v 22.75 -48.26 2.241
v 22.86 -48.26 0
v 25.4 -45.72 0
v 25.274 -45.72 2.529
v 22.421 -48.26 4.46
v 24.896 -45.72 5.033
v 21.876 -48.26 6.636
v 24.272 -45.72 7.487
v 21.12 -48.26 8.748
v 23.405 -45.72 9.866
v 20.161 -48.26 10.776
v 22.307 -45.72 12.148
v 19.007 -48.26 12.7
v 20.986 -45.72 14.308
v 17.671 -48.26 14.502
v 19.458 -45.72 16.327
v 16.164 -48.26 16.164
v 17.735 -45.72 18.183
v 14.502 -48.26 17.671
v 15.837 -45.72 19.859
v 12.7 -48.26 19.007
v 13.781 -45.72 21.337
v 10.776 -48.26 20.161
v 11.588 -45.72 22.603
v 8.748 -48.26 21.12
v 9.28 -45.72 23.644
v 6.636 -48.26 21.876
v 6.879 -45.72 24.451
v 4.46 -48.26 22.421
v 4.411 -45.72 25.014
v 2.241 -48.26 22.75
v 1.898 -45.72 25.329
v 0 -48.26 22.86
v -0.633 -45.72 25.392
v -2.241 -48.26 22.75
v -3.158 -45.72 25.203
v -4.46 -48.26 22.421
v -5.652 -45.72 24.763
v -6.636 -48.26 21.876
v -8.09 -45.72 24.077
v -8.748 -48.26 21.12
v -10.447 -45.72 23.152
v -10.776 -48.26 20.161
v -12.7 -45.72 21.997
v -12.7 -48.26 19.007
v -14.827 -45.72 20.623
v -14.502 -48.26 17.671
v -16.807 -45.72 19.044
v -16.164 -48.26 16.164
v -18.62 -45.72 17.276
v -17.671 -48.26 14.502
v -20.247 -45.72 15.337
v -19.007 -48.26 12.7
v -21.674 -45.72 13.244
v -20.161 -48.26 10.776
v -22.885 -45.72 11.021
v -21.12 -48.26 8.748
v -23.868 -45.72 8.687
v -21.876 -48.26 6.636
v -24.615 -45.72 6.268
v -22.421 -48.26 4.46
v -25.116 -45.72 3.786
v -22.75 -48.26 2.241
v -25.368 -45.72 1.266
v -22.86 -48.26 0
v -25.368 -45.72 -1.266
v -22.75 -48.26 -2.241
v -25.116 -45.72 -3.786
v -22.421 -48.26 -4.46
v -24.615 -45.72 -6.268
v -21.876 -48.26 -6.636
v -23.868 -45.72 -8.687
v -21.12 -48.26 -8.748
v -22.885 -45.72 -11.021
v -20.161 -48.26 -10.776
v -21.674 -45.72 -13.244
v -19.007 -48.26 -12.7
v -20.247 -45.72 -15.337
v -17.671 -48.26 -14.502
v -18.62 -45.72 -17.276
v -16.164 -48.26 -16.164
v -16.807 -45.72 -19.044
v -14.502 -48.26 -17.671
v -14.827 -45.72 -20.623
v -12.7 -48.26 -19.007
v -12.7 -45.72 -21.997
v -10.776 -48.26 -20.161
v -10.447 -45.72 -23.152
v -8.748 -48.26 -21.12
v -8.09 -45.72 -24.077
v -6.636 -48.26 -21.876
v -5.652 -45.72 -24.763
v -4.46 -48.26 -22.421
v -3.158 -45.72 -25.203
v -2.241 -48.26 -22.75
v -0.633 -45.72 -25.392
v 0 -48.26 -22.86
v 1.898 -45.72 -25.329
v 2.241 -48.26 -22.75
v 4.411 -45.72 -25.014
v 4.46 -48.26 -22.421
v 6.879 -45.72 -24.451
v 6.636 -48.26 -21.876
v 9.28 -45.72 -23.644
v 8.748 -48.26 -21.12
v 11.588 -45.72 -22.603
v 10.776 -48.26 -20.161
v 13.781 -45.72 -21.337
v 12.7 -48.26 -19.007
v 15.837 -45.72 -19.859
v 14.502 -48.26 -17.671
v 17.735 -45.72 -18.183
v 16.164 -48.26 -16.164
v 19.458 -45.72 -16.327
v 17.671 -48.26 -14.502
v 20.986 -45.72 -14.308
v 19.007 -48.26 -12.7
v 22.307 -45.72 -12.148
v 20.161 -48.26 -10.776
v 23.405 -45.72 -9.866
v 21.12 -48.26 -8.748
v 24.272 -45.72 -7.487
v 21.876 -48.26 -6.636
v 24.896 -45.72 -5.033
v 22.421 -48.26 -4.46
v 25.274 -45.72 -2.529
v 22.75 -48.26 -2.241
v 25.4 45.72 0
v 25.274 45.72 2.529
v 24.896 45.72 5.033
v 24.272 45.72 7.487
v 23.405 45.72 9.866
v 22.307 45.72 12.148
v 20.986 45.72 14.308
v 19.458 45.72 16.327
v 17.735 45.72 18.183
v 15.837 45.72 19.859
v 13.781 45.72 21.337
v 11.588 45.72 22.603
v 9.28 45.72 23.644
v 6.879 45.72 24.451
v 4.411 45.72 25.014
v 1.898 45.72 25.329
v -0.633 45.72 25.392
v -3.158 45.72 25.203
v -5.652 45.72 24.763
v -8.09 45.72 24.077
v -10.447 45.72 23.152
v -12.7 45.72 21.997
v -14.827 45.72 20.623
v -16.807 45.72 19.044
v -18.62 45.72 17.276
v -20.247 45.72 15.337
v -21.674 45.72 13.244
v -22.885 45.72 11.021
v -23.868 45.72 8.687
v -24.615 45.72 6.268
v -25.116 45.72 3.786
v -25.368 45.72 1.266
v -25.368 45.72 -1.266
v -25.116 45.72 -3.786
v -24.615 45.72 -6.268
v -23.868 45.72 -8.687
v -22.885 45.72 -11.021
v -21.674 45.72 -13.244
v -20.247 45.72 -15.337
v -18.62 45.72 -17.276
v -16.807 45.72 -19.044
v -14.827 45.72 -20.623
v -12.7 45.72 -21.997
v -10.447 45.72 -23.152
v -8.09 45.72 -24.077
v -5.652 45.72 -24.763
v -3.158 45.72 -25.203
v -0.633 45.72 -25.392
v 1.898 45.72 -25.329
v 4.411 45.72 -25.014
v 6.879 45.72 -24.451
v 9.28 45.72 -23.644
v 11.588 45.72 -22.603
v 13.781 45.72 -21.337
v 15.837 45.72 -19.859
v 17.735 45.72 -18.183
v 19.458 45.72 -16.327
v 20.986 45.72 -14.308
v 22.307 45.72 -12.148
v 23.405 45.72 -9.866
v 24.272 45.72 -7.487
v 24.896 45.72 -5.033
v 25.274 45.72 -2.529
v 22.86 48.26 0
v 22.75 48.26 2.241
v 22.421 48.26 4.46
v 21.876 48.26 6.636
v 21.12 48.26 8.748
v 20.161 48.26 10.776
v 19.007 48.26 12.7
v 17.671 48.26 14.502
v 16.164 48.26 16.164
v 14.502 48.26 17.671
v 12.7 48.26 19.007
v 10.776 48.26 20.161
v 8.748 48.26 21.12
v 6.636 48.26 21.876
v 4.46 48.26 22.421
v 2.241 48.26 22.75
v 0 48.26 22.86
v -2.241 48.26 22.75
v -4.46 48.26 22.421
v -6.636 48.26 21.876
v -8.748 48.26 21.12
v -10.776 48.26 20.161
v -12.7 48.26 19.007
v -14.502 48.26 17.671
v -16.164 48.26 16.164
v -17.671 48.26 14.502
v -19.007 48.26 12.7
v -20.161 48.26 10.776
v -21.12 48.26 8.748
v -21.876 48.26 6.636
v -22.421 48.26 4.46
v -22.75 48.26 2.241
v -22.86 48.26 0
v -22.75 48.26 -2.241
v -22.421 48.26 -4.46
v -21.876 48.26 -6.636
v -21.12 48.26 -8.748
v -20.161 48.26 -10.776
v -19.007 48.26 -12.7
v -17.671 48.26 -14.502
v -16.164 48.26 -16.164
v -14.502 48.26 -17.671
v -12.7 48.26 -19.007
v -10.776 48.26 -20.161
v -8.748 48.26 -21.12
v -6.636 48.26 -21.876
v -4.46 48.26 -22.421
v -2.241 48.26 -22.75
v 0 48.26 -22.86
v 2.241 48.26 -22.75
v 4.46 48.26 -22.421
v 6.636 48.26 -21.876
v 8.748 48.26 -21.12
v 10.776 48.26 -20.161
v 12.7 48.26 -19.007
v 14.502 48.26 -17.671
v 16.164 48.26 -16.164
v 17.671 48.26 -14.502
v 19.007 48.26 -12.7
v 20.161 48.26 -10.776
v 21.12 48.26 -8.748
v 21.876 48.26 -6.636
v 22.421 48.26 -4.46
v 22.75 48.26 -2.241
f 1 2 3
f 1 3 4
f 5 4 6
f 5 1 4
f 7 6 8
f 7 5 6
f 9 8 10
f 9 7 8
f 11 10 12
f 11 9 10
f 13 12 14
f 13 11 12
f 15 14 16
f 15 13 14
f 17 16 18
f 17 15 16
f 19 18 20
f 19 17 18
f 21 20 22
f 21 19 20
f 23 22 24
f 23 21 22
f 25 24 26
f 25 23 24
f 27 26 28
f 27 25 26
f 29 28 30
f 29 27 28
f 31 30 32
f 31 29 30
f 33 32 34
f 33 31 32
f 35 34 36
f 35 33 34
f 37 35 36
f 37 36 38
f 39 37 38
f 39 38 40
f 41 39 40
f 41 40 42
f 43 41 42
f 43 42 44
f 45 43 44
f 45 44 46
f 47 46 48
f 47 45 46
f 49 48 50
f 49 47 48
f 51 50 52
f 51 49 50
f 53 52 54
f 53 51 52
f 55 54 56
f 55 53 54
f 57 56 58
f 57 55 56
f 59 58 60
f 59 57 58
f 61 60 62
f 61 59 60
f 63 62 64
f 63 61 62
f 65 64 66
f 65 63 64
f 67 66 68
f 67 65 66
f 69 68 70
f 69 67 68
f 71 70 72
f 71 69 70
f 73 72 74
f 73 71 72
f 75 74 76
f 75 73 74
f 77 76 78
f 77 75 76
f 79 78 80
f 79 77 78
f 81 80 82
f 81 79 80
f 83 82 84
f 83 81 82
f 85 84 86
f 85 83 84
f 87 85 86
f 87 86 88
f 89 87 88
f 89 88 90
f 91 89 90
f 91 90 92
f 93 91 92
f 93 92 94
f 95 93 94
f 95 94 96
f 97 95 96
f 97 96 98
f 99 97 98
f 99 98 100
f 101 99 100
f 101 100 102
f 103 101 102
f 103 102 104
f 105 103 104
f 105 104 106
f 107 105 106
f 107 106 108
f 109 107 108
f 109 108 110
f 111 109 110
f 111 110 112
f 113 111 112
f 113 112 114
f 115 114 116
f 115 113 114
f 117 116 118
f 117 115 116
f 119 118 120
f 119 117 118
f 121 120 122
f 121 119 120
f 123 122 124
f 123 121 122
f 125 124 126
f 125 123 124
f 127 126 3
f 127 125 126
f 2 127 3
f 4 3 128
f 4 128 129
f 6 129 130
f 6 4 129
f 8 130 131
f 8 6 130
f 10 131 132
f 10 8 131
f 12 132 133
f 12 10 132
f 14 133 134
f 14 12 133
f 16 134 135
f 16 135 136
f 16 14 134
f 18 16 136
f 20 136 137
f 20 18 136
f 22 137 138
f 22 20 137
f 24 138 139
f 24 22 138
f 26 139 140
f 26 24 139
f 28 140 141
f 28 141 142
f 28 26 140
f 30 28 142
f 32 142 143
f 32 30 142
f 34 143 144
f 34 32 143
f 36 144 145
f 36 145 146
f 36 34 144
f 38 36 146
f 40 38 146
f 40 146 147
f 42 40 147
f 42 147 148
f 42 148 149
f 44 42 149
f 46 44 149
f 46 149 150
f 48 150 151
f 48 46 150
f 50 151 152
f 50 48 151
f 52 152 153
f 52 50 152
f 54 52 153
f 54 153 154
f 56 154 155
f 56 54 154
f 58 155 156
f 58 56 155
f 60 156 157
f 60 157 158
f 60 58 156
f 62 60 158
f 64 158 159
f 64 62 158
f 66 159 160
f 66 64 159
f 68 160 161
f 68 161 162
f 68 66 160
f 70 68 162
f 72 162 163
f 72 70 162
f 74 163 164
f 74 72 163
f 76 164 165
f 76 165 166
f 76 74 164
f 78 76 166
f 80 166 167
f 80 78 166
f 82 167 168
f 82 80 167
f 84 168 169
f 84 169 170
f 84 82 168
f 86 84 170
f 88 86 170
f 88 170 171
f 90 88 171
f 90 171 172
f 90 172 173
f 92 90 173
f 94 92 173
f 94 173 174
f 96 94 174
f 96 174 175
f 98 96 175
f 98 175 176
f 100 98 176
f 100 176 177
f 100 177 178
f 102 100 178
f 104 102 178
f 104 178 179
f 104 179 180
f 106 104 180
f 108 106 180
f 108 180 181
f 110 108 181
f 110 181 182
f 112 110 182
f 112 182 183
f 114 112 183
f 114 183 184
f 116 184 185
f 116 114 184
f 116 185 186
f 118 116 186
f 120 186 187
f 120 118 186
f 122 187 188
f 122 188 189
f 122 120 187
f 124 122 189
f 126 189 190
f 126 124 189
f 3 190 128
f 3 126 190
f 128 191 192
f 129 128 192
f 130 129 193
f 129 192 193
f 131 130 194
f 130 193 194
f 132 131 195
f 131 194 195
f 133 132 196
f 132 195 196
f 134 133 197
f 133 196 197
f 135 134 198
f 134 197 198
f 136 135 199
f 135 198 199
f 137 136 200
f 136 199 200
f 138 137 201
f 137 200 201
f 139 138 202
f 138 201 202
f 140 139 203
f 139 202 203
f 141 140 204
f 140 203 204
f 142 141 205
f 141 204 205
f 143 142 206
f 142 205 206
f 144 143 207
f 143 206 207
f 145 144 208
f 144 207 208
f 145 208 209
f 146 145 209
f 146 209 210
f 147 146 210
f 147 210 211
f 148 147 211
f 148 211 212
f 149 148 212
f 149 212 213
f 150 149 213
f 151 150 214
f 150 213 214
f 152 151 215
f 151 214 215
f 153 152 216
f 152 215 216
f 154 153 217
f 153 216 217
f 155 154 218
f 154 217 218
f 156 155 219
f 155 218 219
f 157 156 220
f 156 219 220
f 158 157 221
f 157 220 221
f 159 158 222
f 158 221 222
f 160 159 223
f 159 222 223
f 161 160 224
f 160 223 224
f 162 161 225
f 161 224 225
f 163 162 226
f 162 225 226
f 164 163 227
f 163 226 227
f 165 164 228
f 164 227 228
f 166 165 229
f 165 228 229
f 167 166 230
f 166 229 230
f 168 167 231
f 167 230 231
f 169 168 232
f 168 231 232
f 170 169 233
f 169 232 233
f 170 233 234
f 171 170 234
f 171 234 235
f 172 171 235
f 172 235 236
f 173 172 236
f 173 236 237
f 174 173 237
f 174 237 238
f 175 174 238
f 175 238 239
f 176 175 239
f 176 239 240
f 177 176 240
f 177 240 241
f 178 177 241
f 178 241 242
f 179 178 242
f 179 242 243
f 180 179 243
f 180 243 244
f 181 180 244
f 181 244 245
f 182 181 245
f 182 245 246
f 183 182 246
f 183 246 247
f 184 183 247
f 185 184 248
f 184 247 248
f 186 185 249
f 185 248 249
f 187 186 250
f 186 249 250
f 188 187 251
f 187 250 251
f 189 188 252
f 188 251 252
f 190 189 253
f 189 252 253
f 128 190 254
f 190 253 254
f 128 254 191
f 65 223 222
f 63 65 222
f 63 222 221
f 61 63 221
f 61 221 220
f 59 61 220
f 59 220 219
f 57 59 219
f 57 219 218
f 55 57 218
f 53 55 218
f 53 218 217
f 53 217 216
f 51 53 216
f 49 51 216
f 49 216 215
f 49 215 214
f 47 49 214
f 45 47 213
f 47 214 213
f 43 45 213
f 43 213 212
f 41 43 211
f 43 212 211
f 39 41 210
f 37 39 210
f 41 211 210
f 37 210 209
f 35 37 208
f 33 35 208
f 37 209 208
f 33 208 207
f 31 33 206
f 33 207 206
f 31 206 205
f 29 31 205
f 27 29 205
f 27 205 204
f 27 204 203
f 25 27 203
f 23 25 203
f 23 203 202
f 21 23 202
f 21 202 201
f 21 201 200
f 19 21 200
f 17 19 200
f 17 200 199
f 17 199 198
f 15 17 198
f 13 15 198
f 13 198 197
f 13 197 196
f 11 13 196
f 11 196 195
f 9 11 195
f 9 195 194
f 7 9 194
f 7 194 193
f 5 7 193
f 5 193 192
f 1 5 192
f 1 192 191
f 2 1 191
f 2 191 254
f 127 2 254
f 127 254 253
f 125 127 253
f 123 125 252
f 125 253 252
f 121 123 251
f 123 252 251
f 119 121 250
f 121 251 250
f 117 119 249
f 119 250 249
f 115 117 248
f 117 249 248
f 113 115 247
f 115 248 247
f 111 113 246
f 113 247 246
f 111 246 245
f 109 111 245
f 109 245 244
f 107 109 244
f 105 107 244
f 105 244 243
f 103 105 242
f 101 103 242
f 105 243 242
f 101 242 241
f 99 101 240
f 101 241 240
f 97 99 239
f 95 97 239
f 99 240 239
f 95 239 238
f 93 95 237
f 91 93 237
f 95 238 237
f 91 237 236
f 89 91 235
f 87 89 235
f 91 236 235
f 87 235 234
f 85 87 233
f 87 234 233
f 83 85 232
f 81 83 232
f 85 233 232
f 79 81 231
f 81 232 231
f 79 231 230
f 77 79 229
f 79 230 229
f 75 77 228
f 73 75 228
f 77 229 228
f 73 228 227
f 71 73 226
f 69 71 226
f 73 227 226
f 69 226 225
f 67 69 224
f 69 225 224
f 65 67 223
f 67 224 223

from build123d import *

# Parameters (mm, degrees)
F0_R     = 25.4
F0_R_2   = 23.495
F1_DEPTH = 50.8
F3_D     = 45.72


# Not quite as in the source:
# - a fillet or chamfer that OpenCascade refuses, or shapes differently, is made with other operations: its cross-section is extruded or revolved along the edge and cut away or added


with BuildPart() as f1:
    # F0 (on Front) → F1 (new body, symmetric)
    with BuildSketch(Plane.XZ):
        Circle(F0_R)
        Circle(F0_R_2, mode=Mode.SUBTRACT)
        Circle(F0_R_2)
    extrude(amount=F1_DEPTH, both=True)

    # F3 (through all)
    with Locations(Plane.XZ.offset(50.8)):
        with Locations((0, 0)):
            Hole(F3_D / 2)

    # F4: chamfer of 5.08 on 3 edges, made by hand

    # F4_s1 → F4_t2 (revolve, cut)
    with BuildSketch(Plane.XY):
        Polygon((25.4, 45.72), (20.32, 50.8), (25.4, 50.8), align=None)
    revolve(axis=Axis((0, 50.8, 0), (0, -1, 0)), mode=Mode.SUBTRACT)

    # F4_s3 → F4_t4 (revolve, cut)
    with BuildSketch(Plane.XY):
        Polygon((25.4, -45.72), (20.32, -50.8), (25.4, -50.8), align=None)
    revolve(axis=Axis((0, -50.8, 0), (0, -1, 0)), mode=Mode.SUBTRACT)


solid = f1.part
